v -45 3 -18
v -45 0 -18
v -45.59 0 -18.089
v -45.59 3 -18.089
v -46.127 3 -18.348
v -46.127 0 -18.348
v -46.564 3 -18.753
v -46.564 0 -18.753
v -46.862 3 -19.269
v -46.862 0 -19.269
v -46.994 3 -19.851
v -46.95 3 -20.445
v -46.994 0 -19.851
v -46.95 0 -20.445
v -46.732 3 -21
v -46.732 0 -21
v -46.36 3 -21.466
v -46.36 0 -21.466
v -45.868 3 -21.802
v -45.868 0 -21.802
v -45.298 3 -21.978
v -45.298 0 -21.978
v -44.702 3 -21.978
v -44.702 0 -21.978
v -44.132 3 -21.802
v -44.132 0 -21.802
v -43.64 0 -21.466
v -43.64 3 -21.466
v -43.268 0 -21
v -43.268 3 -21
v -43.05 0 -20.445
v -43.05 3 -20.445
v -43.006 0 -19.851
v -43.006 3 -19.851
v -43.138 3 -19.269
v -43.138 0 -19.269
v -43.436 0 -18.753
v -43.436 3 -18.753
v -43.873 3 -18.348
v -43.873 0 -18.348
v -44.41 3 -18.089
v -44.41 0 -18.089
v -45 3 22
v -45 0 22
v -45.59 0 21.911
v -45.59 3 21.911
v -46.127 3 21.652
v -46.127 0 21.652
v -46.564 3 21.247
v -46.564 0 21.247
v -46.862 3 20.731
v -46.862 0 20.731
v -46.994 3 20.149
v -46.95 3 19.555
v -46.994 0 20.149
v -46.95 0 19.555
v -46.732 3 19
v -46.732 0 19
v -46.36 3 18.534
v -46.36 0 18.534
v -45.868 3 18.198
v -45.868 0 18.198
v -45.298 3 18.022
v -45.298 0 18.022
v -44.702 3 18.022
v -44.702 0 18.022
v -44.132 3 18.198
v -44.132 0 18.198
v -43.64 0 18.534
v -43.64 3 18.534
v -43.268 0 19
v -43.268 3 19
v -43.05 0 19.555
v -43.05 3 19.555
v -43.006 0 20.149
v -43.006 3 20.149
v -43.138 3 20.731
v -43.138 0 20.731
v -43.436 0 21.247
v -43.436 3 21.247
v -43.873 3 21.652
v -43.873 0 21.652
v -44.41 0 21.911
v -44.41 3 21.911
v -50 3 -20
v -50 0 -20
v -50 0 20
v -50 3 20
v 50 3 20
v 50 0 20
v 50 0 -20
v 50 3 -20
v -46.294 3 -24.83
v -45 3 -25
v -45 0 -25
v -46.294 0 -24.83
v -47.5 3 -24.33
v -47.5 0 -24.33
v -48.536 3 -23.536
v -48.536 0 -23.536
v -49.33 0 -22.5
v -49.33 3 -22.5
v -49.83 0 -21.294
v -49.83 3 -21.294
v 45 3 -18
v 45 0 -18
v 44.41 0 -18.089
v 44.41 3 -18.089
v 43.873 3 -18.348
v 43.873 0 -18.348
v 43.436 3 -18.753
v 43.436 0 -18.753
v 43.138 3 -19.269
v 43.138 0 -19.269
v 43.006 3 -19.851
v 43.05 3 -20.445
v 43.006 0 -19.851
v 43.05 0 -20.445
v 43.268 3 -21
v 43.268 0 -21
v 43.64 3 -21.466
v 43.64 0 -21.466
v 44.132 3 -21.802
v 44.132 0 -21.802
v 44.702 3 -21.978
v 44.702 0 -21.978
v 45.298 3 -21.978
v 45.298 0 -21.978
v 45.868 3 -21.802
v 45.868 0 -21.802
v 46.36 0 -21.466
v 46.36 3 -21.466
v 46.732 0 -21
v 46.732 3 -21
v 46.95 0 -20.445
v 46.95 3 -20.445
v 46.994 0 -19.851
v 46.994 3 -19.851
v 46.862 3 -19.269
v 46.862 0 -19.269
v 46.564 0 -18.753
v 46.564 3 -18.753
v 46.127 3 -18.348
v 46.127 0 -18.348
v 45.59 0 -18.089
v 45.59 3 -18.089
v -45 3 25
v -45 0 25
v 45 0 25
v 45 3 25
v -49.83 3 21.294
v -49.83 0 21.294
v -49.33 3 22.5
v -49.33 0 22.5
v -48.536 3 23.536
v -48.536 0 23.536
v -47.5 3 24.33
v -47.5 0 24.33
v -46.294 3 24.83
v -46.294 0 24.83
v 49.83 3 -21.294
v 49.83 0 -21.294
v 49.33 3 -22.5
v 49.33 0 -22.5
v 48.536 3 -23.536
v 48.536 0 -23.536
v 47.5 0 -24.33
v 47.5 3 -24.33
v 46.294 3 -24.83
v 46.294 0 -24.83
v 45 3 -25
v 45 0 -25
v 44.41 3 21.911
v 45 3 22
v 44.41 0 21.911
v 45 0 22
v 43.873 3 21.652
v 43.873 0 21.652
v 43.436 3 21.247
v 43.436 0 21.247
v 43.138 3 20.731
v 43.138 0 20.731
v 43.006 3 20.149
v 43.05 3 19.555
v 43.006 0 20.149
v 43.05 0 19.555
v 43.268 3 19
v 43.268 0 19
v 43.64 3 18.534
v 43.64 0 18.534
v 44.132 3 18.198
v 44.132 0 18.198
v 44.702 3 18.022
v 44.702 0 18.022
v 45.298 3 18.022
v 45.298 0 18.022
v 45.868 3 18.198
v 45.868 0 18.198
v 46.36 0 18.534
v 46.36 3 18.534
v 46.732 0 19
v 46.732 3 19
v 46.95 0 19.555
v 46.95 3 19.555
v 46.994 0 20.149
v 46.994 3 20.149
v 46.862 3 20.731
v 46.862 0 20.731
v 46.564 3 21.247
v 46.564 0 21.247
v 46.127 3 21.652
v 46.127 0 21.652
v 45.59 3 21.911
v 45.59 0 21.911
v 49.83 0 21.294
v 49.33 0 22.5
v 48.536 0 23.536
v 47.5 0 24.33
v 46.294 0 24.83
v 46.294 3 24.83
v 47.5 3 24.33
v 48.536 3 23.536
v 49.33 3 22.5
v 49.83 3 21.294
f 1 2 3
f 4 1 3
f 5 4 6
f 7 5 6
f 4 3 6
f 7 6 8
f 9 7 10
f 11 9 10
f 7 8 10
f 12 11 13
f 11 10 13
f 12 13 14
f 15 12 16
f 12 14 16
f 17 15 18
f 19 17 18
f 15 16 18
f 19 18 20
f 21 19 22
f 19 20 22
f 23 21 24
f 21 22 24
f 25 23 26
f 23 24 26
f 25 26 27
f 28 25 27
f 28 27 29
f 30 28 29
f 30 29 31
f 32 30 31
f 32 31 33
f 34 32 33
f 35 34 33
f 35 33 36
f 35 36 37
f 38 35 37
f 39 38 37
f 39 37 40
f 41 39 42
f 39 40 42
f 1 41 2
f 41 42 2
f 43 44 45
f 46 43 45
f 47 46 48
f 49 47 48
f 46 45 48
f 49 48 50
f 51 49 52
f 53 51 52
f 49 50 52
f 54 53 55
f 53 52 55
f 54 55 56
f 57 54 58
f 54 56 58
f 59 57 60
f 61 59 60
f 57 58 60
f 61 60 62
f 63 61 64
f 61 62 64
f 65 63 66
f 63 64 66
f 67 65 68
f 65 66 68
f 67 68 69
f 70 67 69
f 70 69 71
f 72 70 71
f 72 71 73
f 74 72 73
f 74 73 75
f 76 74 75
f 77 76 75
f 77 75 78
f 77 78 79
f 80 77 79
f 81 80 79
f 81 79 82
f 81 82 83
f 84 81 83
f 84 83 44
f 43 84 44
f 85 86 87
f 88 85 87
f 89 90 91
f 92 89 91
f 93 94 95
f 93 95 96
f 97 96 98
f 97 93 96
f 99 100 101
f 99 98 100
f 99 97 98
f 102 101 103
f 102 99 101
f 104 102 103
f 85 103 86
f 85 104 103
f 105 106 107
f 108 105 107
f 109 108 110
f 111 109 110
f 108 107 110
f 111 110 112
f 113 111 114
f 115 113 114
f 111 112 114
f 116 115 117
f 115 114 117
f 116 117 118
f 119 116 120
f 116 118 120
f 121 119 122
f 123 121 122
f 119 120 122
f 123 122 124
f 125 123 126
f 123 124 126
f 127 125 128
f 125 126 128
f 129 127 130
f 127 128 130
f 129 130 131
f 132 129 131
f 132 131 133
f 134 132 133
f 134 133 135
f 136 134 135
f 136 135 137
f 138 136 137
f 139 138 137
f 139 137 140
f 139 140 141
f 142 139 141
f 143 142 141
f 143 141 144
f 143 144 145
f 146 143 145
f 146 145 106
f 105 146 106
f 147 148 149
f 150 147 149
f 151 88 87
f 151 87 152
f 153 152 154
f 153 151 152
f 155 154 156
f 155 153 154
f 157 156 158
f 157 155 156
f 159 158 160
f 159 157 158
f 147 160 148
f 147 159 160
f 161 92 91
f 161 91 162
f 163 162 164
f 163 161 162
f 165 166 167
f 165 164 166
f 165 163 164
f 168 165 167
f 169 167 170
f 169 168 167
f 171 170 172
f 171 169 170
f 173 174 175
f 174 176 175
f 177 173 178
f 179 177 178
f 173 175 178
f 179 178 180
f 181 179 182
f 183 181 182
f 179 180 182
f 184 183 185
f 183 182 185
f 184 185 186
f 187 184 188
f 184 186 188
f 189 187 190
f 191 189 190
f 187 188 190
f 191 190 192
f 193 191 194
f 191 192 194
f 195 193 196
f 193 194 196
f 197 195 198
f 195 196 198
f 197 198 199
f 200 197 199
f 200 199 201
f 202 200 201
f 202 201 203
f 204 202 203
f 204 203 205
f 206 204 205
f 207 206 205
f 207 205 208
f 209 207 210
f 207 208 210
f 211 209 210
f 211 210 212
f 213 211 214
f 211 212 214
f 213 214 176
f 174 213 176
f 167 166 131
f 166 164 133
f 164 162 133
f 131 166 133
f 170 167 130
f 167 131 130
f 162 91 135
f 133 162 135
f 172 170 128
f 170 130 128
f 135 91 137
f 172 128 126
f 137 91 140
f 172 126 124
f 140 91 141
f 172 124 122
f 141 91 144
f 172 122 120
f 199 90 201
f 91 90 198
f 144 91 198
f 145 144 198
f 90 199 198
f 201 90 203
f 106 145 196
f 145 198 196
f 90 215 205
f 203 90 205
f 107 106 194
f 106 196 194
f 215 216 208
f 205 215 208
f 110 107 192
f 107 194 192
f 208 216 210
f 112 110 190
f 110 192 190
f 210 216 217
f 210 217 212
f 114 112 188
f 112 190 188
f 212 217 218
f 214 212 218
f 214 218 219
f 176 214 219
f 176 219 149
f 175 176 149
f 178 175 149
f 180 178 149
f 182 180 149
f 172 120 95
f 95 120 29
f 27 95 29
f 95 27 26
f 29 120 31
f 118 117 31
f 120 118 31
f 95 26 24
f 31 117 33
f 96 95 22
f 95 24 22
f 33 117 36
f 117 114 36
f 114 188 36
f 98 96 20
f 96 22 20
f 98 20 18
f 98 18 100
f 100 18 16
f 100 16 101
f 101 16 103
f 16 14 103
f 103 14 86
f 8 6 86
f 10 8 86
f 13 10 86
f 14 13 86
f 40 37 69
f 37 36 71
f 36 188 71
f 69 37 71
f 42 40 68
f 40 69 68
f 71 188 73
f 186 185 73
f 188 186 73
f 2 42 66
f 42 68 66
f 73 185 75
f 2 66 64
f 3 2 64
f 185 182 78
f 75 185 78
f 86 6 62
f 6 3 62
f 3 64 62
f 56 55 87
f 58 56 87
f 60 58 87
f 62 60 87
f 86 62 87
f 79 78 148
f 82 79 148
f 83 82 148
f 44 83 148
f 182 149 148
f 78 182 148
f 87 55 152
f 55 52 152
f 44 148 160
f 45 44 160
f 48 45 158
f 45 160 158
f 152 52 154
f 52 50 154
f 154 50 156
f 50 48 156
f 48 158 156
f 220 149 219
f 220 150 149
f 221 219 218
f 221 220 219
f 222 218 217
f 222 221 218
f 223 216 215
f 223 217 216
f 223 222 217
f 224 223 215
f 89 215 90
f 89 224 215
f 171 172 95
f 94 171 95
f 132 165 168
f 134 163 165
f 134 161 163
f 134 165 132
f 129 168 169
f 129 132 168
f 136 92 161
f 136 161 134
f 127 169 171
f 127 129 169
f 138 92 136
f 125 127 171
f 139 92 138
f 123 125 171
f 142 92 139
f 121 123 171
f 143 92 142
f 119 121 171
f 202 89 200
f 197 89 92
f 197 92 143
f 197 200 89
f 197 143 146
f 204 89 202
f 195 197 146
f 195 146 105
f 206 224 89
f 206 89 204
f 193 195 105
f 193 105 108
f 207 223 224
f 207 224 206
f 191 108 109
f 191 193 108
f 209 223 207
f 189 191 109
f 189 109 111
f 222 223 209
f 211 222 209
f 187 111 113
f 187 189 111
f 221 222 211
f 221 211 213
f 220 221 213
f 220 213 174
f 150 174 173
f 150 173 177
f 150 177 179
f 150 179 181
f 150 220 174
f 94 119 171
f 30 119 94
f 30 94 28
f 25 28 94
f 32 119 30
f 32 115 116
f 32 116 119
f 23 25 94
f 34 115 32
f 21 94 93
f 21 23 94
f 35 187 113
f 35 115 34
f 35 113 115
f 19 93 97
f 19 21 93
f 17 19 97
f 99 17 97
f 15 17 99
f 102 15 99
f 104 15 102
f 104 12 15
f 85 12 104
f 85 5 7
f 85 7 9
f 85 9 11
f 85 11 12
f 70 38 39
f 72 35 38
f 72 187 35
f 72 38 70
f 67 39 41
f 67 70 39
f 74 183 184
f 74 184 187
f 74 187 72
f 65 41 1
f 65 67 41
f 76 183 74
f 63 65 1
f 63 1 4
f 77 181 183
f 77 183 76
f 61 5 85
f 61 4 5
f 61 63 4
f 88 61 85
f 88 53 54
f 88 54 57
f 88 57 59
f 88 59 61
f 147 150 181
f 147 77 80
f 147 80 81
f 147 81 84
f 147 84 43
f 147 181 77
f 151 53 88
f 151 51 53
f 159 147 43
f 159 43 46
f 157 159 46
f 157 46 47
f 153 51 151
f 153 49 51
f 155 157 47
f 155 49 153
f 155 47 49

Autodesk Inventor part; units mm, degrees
ref_plane "YZ Plane" through (0, 0, 0) normal (1, 0, 0) x (0, 1, 0)
ref_plane "XZ Plane" through (0, 0, 0) normal (0, 1, 0) x (-1, 0, 0)
ref_plane "XY Plane" through (0, 0, 0) normal (0, 0, 1) x (1, 0, 0)
sketch "Sketch1" plane through (0, 0, 0) normal (0, 1, 0) x (-1, 0, 0)
  line L0 (50, 25) -> (-50, 25)
  line L1 (-50, 25) -> (-50, -25)
  line L2 (-50, -25) -> (50, -25)
  line L3 (50, -25) -> (50, 25)
  line L4 (50, 25) -> (-50, -25) construction
  line L5 (-50, 25) -> (50, -25) construction
  point P0 (0, 0)
  dimension "d0" = 100
  dimension "d1" = 50
extrude "Extrusion1" add sketch "Sketch1" along normal blind 3
fillet "Fillet1" radius 5 4 edges at (50, 1.5, 25) (50, 1.5, -25) (-50, 1.5, -25) (-50, 1.5, 25)
sketch "Sketch2" plane through (0, 3, 0) normal (0, 1, 0) x (1, 0, 0)
  arc A0 (-50, -20) -> (-45, -25) centre (-45, -20) ccw projected
  arc A1 (45, -25) -> (50, -20) centre (45, -20) ccw projected
  arc A2 (50, 20) -> (45, 25) centre (45, 20) ccw projected
  arc A3 (-45, 25) -> (-50, 20) centre (-45, 20) ccw projected
  point P0 (0, 0)
hole "Hole1" at (-45, 3, -20) at (-45, 3, 20) at (45, 3, 20) at (45, 3, -20) direction (0, -1, 0) diameter 4 end through all
properties part number "AcrylicLowerBottom" material "Acrylic, Clear"
